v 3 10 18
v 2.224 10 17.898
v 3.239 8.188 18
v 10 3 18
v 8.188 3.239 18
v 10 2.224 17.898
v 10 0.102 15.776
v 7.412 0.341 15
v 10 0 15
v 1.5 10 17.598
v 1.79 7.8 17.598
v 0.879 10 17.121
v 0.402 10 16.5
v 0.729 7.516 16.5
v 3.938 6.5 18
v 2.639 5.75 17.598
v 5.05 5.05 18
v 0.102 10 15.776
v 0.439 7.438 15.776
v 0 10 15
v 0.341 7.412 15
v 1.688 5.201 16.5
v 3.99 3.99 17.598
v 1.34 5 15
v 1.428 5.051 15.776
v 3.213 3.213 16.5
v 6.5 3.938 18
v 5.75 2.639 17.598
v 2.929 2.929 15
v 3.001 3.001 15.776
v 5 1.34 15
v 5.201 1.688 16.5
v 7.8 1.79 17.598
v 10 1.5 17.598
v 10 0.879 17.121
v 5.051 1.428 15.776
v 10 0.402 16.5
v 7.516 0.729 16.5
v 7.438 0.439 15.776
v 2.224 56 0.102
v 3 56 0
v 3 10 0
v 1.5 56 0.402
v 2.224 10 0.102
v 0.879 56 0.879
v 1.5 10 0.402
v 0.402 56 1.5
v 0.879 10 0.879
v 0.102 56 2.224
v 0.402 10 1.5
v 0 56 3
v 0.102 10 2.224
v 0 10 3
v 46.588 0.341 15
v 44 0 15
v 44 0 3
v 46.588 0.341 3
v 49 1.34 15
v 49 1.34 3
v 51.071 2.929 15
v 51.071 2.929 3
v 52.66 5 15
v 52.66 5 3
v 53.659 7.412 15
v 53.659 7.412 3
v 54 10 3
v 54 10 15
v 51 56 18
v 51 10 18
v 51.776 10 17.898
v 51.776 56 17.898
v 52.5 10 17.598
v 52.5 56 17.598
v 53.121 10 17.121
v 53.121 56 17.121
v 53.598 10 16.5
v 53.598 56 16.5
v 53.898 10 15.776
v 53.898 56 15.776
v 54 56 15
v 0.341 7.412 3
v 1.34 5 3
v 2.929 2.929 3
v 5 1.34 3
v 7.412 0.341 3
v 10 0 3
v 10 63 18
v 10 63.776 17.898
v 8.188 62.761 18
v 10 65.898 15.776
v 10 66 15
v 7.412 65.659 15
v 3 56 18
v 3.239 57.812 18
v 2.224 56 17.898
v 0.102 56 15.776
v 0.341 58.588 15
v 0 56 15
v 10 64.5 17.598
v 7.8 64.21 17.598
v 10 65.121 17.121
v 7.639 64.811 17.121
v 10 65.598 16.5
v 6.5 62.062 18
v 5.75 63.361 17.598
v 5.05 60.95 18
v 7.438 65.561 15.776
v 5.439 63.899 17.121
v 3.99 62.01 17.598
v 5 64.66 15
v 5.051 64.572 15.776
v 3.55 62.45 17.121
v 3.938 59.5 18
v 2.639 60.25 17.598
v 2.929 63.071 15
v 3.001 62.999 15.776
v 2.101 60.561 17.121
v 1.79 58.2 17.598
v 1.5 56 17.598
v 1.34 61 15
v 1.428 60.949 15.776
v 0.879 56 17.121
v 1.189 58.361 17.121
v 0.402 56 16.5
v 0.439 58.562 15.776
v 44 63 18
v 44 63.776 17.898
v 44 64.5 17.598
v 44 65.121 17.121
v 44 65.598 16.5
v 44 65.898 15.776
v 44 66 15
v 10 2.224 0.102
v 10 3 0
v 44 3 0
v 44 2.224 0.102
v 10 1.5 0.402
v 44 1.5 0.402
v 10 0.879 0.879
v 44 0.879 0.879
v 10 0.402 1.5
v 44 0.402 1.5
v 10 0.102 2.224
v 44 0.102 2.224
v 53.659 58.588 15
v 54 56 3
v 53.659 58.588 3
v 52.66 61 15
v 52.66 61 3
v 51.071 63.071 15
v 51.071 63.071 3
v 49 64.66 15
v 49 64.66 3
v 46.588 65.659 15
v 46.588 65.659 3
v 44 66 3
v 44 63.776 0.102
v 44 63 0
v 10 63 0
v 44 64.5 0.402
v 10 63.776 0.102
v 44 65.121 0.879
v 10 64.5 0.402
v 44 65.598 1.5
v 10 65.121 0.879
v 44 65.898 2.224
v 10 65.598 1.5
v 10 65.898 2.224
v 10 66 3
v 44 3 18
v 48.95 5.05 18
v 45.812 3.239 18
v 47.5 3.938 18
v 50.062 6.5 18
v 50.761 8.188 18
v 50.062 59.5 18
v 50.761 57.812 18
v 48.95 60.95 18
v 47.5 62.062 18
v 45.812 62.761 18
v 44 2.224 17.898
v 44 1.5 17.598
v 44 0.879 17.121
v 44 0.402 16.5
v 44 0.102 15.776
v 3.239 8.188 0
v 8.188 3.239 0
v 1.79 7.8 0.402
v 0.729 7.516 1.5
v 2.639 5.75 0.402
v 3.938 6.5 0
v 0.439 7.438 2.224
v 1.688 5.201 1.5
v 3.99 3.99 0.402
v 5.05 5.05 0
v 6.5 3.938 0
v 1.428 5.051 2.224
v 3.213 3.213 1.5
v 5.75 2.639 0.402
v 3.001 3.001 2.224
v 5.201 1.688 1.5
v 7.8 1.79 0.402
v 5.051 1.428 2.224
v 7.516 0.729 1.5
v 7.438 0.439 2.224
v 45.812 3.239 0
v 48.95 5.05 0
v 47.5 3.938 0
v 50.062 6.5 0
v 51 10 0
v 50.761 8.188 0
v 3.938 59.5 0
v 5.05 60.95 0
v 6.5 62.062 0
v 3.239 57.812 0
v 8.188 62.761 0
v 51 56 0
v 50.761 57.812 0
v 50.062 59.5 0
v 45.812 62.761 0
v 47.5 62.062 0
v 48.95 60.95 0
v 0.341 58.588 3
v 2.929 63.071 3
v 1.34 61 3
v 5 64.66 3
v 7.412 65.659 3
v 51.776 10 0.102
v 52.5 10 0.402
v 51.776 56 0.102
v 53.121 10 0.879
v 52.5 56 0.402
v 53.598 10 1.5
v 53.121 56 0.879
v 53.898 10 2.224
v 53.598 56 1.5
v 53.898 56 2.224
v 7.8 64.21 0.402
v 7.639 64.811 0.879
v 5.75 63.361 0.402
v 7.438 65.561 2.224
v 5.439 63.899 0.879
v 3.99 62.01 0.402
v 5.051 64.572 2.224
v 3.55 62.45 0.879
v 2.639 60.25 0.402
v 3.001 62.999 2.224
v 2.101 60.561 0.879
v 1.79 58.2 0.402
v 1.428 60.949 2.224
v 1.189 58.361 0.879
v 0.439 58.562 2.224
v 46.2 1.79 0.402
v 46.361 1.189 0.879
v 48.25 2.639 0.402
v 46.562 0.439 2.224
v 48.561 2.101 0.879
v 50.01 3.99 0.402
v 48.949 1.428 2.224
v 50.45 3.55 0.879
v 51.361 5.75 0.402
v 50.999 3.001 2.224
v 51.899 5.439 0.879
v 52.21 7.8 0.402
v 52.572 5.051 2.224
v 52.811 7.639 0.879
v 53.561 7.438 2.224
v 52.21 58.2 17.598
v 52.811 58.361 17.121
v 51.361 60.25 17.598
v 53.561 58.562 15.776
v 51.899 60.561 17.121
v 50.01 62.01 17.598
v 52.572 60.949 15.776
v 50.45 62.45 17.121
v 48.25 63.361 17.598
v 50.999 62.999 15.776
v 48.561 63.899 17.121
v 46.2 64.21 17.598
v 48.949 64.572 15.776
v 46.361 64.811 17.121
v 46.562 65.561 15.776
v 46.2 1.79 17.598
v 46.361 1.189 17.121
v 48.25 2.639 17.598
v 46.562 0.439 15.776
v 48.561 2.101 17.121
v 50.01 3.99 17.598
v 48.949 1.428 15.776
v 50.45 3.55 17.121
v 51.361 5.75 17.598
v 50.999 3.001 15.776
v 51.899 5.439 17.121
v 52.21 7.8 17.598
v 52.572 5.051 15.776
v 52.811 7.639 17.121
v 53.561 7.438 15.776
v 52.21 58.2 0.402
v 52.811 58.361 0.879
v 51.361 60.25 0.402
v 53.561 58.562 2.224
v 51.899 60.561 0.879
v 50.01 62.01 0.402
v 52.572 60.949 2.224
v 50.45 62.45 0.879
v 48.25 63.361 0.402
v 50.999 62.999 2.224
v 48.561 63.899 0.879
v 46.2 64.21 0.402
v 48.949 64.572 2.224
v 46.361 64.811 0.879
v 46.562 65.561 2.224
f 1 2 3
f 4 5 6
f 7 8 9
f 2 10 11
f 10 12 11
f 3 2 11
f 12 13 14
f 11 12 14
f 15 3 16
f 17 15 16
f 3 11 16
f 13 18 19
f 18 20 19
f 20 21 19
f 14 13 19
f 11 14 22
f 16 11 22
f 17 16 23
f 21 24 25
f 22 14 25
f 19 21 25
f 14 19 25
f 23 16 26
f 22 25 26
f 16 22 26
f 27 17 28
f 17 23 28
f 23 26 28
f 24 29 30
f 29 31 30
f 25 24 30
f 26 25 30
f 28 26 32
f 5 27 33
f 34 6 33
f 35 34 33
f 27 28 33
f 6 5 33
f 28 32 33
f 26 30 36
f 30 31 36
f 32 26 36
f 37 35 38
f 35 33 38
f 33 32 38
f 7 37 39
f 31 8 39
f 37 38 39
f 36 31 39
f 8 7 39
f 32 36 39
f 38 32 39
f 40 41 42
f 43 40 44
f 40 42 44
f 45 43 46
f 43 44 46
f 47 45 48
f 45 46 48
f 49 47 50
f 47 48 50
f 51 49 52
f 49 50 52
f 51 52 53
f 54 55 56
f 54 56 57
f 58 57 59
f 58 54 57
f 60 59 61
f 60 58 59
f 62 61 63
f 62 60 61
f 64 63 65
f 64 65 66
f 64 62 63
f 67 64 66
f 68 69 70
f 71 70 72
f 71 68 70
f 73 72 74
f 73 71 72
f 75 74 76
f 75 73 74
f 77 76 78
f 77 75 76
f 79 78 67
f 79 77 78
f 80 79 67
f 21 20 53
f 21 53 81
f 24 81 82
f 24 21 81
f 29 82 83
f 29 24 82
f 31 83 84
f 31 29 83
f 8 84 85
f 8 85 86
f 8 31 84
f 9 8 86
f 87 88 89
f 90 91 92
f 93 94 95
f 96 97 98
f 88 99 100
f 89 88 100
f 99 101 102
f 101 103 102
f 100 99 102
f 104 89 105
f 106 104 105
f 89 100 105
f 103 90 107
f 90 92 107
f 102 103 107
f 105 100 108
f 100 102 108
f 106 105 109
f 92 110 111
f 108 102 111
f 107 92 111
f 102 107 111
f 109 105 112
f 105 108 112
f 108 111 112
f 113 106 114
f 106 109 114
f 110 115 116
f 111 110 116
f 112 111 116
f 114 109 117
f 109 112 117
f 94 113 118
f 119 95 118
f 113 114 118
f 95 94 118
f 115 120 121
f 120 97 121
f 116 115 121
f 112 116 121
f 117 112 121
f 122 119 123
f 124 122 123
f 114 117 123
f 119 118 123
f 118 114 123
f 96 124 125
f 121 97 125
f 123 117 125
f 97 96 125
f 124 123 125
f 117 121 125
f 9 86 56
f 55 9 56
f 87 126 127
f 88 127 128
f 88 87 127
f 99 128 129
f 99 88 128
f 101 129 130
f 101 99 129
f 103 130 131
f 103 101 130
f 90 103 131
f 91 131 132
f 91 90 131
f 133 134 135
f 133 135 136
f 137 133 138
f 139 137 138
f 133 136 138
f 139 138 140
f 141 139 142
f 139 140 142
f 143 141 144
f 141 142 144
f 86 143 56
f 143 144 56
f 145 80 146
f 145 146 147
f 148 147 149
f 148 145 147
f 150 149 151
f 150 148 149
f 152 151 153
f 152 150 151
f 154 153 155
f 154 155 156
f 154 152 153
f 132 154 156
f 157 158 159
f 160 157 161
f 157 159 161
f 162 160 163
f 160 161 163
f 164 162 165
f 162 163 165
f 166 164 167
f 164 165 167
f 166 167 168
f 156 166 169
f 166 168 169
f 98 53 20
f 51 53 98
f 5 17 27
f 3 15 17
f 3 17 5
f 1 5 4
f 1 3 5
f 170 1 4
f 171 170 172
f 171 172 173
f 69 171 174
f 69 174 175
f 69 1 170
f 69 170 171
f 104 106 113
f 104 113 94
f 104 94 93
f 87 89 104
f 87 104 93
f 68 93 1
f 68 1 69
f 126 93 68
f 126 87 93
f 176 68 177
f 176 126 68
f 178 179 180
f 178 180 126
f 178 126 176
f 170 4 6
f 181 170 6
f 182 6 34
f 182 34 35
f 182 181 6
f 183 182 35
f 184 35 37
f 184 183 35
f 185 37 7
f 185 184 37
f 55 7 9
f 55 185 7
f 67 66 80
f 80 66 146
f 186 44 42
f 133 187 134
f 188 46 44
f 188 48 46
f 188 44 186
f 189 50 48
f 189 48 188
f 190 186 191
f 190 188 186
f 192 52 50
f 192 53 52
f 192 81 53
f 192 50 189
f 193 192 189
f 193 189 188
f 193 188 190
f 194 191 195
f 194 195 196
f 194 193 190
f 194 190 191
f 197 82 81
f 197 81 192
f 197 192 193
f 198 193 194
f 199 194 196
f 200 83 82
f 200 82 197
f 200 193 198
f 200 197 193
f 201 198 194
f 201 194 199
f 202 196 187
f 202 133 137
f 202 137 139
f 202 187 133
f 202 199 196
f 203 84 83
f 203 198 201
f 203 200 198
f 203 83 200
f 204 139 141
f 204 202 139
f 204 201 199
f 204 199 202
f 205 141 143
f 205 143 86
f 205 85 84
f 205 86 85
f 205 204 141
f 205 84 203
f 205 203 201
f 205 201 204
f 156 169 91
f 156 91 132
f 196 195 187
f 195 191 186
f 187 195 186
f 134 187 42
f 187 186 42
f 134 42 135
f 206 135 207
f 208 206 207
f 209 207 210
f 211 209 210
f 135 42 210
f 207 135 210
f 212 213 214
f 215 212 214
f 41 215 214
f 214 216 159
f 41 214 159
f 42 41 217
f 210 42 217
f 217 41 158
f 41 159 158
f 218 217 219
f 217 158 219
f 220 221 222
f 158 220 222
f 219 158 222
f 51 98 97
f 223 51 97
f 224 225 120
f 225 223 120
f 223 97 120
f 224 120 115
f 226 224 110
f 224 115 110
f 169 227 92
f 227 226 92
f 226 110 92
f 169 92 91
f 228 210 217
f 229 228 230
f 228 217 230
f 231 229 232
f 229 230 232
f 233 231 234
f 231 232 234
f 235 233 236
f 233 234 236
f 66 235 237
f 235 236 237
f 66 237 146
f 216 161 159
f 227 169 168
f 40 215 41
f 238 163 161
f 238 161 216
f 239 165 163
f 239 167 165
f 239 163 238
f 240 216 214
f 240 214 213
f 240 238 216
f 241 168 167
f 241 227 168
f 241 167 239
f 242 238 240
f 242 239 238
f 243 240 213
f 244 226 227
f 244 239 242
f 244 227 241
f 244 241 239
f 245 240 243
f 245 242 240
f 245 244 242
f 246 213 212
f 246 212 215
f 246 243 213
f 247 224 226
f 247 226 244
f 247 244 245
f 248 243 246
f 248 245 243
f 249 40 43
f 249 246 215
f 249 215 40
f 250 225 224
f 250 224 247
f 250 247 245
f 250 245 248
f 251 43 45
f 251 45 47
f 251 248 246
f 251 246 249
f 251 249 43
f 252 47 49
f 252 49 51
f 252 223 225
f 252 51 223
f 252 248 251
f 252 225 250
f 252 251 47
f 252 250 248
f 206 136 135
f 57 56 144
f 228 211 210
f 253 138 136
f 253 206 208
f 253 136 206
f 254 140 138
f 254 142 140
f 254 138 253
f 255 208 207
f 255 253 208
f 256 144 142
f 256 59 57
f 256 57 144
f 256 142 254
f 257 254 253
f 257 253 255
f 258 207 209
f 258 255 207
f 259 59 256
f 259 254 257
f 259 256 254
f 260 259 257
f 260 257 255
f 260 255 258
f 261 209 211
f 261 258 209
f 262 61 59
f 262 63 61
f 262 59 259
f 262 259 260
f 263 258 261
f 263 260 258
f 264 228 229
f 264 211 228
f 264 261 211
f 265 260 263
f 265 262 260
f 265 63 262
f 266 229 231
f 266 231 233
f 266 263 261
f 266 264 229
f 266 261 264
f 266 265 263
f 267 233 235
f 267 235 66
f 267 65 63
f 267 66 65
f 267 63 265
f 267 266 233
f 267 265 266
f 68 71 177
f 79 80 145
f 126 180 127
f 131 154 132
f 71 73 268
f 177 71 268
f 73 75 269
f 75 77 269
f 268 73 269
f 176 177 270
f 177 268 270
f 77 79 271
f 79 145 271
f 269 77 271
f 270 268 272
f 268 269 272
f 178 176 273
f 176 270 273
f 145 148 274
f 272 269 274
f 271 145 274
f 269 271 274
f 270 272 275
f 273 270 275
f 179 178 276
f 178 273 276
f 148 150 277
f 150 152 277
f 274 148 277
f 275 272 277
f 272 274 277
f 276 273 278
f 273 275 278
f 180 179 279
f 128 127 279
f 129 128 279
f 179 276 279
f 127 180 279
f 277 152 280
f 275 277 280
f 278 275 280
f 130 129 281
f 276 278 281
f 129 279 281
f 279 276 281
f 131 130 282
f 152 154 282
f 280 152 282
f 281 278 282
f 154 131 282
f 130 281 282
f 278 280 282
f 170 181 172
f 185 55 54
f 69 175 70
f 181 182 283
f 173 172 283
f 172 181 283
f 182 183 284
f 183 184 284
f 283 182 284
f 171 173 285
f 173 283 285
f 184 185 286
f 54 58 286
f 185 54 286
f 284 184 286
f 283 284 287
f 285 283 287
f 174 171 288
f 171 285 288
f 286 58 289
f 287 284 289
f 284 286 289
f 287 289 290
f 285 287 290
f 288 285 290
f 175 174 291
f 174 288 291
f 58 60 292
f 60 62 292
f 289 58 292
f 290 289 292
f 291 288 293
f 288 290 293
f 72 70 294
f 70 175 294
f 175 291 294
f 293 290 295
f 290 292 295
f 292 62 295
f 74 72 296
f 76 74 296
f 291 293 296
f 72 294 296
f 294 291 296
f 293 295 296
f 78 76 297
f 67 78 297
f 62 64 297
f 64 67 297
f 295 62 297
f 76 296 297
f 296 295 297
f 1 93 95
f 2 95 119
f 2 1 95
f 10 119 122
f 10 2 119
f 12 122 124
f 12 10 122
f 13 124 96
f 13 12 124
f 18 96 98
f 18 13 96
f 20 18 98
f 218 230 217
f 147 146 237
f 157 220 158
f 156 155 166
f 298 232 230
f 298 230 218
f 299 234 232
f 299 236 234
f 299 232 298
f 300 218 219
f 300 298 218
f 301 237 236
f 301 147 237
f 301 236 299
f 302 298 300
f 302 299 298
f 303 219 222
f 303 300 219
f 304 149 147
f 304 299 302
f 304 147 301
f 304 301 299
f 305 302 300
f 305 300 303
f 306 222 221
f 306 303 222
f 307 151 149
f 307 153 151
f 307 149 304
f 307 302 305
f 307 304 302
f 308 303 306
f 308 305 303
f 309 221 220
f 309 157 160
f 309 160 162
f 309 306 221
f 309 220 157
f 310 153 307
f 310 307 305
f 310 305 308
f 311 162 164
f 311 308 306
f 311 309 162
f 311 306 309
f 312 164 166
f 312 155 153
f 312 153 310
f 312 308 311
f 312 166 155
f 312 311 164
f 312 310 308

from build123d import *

# Parameters (mm, degrees)
SKETCH_1_W      = 54
SKETCH_1_H      = 66
EXTRUDE_1_DEPTH = 18
FILLET_1_R      = 10
FILLET_2_R      = 3


with BuildPart() as part:
    # 草图1 → 凸台-拉伸1 (new body)
    with BuildSketch(Plane.XY):
        with Locations((27, 33)):
            Rectangle(SKETCH_1_W, SKETCH_1_H)
    extrude(amount=EXTRUDE_1_DEPTH)

    # 圆角1
    fillet_1_edges = [part.edges().sort_by_distance(p)[0] for p in [
        (0, 66, 9),
        (54, 66, 9),
        (54, 0, 9),
        (0, 0, 9),
    ]]
    fillet(fillet_1_edges, radius=FILLET_1_R)

    # 圆角2
    fillet_2_edges = [part.edges().sort_by_distance(p)[0] for p in [
        (27, 0, 0),
        (27, 0, 18),
        (0, 33, 0),
        (27, 66, 0),
        (54, 33, 0),
        (2.928932188, 63.071067812, 0),
        (51.071067812, 63.071067812, 0),
        (51.071067812, 2.928932188, 0),
        (2.928932188, 2.928932188, 0),
        (0, 33, 18),
        (54, 33, 18),
        (27, 66, 18),
        (2.928932188, 63.071067812, 18),
        (51.071067812, 63.071067812, 18),
        (51.071067812, 2.928932188, 18),
        (2.928932188, 2.928932188, 18),
    ]]
    fillet(fillet_2_edges, radius=FILLET_2_R)


solid = part.part
